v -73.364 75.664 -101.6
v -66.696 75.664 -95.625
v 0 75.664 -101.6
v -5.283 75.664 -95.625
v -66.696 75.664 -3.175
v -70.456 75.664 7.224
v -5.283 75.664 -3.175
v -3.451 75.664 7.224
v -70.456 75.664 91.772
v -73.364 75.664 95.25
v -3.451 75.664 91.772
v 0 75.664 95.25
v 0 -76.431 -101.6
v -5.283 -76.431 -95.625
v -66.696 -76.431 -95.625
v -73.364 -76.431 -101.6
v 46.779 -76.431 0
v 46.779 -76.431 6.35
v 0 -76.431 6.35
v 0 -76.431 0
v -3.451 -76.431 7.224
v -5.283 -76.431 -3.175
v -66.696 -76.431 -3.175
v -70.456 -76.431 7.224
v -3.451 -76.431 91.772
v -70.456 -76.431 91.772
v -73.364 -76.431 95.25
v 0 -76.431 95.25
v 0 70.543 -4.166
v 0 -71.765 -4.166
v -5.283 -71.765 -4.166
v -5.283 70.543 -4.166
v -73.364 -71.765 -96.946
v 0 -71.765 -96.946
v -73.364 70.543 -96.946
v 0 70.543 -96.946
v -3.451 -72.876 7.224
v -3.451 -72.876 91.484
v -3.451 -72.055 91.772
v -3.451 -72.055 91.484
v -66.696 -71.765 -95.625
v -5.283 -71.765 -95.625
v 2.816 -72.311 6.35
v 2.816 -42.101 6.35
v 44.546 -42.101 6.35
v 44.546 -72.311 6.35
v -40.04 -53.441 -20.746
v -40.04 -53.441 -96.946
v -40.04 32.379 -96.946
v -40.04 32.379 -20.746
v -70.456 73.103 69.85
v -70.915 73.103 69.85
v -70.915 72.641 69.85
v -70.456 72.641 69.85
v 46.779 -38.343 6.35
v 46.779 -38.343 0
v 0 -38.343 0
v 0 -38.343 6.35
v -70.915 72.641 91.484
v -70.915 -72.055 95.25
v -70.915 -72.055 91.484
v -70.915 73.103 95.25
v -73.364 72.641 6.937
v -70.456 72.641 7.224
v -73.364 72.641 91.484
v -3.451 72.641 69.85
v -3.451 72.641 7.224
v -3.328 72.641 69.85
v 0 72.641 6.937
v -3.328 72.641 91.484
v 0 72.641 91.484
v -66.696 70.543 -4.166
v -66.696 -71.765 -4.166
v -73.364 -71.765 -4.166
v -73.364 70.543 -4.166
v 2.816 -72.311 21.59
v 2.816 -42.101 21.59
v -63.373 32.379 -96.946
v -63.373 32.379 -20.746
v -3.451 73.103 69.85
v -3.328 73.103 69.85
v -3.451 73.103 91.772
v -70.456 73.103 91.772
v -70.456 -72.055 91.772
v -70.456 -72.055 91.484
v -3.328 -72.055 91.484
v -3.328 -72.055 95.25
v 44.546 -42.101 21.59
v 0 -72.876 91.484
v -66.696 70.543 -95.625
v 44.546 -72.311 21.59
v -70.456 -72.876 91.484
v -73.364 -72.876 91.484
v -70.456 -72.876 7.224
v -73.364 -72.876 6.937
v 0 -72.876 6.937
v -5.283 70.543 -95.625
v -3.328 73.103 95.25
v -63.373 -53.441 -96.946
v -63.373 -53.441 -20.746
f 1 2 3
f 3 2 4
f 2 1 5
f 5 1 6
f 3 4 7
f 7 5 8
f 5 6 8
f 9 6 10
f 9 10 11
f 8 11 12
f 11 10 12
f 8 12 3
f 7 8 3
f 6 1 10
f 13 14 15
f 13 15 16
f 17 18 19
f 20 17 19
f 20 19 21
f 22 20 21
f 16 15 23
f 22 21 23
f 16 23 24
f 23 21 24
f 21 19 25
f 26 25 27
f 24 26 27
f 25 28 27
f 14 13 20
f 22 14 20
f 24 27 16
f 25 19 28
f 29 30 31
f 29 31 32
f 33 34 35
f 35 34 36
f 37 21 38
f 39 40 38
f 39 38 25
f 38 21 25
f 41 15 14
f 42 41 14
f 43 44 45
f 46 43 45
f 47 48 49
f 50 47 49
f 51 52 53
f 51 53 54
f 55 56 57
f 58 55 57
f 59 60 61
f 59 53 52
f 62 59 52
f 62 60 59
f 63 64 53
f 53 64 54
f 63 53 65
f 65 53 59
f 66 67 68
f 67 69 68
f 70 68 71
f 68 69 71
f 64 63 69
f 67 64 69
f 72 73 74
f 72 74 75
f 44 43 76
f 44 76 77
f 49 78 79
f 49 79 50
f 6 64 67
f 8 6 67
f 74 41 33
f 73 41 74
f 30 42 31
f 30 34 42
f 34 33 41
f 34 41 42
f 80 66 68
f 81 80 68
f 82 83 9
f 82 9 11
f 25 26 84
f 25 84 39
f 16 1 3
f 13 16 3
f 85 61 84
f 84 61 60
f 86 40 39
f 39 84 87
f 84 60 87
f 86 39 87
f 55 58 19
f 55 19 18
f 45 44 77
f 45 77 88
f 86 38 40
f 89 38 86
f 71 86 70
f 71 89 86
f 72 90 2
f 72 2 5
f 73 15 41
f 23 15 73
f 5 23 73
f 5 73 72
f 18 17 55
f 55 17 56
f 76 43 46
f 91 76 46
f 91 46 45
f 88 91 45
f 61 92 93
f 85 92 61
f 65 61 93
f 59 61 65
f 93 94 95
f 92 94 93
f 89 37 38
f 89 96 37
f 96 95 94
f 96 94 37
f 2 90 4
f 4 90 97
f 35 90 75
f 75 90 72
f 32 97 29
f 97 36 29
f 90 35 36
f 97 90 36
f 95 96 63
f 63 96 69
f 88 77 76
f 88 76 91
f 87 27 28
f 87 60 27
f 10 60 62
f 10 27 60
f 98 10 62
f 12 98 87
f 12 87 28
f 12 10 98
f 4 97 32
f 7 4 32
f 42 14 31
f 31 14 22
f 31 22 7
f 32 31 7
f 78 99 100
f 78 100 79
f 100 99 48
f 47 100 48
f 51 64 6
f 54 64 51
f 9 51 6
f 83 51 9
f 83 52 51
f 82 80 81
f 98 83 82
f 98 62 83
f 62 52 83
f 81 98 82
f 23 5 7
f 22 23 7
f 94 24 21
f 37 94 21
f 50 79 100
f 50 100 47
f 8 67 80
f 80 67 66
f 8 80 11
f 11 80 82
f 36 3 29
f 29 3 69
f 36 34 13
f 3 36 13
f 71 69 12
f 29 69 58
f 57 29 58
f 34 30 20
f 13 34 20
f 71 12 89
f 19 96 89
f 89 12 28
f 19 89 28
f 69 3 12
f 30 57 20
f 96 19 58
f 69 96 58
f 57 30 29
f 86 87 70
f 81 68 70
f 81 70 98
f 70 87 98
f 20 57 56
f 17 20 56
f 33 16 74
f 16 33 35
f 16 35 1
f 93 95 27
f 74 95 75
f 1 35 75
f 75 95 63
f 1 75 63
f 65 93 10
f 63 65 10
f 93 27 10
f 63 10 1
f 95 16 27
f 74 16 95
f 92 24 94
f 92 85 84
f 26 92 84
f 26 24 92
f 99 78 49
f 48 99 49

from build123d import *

# Parameters (mm, degrees)
F1_DEPTH  = 6.35
F2_W      = 73.3638033271
F2_H      = 152.095682919
F3_DEPTH  = 88.9
F4_W      = 67.0051856432
F4_H      = 84.5473129302
F5_DEPTH  = 152.096682919
F6_W      = 145.5166
F6_H      = 84.5473115332
F7_DEPTH  = 73.3648033271
F9_DEPTH  = 101.6
F10_W     = 61.4134236239
F10_H     = 92.4503207207
F11_DEPTH = 152.096682919
F12_W     = 142.3074528575
F12_H     = 92.7804936655
F13_DEPTH = 73.3648033271
F14_W     = 41.7297899257
F14_H     = 30.2092880011
F15_DEPTH = 15.24
F16_W     = 23.332670331
F16_H     = 85.8200117946
F17_DEPTH = 76.2
F18_W     = 67.5868841354
F18_H     = 145.1581940055
F19_DEPTH = 25.4


with BuildPart() as f1:
    # F0 (on Top) → F1 (new body)
    with BuildSketch(Plane.XY):
        Polygon((0, -38.3434519172), (0, 0), (0, 75.664408505), (-73.3638033271, 75.664408505), (-73.3638033271, -76.4312744141), (46.7790141702, -76.4312744141), (46.7790141702, -38.3434519172), align=None)
    extrude(amount=F1_DEPTH)

    # F2 (on face) → F3 (join)
    with BuildSketch(Plane.XY.offset(6.35)):
        with Locations((-36.6819016635, -0.3834329545)):
            Rectangle(F2_W, F2_H)
    extrude(amount=F3_DEPTH)

    # F4 (on face) → F5 (cut, through all)
    with BuildSketch(Plane.XZ.offset(76.4312744141)):
        with Locations((-36.9535022182, 49.4980504736)):
            Rectangle(F4_W, F4_H)
    extrude(amount=-F5_DEPTH, mode=Mode.SUBTRACT)

    # F6 (on face) → F7 (cut, through all)
    with BuildSketch(Plane.YZ):
        with Locations((-0.1172402437, 49.2104736622)):
            Rectangle(F6_W, F6_H)
    extrude(amount=-F7_DEPTH, mode=Mode.SUBTRACT)

    # F8 (on face) → F9 (join)
    with BuildSketch(Plane(origin=(0, 0, 0), x_dir=(1, 0, 0), z_dir=(0, 0, -1))):
        Polygon((0, 76.4312744141), (-73.3638033271, 76.4312744141), (-73.3638033271, -75.664408505), (0, -75.664408505), (0, 38.3434519172), align=None)
    extrude(amount=F9_DEPTH)

    # F10 (on face) → F11 (cut, through all)
    with BuildSketch(Plane.XZ.offset(76.4312744141)):
        with Locations((-35.9895892907, -49.4001582265)):
            Rectangle(F10_W, F10_H)
    extrude(amount=-F11_DEPTH, mode=Mode.SUBTRACT)

    # F12 (on face) → F13 (cut, through all)
    with BuildSketch(Plane.YZ):
        with Locations((-0.6109066308, -50.5557840224)):
            Rectangle(F12_W, F12_H)
    extrude(amount=-F13_DEPTH, mode=Mode.SUBTRACT)

    # F18 (on face) → F19 (cut)
    with BuildSketch(Plane.XY.offset(95.25)):
        with Locations((-37.1215863852, 0.5243904889)):
            Rectangle(F18_W, F18_H)
    extrude(amount=-F19_DEPTH, mode=Mode.SUBTRACT)


with BuildPart() as f15:
    # F14 (on face) → F15 (new body)
    with BuildSketch(Plane.XY.offset(6.35)):
        with Locations((23.6810125643, -57.2060719132)):
            Rectangle(F14_W, F14_H)
    extrude(amount=F15_DEPTH)


with BuildPart() as f17:
    # F16 (on face) → F17 (new body)
    with BuildSketch(Plane.XY.offset(-96.9460308552)):
        with Locations((-51.7062321305, -10.5309672654)):
            Rectangle(F16_W, F16_H)
    extrude(amount=F17_DEPTH)


solid = Compound([f1.part, f15.part, f17.part])
